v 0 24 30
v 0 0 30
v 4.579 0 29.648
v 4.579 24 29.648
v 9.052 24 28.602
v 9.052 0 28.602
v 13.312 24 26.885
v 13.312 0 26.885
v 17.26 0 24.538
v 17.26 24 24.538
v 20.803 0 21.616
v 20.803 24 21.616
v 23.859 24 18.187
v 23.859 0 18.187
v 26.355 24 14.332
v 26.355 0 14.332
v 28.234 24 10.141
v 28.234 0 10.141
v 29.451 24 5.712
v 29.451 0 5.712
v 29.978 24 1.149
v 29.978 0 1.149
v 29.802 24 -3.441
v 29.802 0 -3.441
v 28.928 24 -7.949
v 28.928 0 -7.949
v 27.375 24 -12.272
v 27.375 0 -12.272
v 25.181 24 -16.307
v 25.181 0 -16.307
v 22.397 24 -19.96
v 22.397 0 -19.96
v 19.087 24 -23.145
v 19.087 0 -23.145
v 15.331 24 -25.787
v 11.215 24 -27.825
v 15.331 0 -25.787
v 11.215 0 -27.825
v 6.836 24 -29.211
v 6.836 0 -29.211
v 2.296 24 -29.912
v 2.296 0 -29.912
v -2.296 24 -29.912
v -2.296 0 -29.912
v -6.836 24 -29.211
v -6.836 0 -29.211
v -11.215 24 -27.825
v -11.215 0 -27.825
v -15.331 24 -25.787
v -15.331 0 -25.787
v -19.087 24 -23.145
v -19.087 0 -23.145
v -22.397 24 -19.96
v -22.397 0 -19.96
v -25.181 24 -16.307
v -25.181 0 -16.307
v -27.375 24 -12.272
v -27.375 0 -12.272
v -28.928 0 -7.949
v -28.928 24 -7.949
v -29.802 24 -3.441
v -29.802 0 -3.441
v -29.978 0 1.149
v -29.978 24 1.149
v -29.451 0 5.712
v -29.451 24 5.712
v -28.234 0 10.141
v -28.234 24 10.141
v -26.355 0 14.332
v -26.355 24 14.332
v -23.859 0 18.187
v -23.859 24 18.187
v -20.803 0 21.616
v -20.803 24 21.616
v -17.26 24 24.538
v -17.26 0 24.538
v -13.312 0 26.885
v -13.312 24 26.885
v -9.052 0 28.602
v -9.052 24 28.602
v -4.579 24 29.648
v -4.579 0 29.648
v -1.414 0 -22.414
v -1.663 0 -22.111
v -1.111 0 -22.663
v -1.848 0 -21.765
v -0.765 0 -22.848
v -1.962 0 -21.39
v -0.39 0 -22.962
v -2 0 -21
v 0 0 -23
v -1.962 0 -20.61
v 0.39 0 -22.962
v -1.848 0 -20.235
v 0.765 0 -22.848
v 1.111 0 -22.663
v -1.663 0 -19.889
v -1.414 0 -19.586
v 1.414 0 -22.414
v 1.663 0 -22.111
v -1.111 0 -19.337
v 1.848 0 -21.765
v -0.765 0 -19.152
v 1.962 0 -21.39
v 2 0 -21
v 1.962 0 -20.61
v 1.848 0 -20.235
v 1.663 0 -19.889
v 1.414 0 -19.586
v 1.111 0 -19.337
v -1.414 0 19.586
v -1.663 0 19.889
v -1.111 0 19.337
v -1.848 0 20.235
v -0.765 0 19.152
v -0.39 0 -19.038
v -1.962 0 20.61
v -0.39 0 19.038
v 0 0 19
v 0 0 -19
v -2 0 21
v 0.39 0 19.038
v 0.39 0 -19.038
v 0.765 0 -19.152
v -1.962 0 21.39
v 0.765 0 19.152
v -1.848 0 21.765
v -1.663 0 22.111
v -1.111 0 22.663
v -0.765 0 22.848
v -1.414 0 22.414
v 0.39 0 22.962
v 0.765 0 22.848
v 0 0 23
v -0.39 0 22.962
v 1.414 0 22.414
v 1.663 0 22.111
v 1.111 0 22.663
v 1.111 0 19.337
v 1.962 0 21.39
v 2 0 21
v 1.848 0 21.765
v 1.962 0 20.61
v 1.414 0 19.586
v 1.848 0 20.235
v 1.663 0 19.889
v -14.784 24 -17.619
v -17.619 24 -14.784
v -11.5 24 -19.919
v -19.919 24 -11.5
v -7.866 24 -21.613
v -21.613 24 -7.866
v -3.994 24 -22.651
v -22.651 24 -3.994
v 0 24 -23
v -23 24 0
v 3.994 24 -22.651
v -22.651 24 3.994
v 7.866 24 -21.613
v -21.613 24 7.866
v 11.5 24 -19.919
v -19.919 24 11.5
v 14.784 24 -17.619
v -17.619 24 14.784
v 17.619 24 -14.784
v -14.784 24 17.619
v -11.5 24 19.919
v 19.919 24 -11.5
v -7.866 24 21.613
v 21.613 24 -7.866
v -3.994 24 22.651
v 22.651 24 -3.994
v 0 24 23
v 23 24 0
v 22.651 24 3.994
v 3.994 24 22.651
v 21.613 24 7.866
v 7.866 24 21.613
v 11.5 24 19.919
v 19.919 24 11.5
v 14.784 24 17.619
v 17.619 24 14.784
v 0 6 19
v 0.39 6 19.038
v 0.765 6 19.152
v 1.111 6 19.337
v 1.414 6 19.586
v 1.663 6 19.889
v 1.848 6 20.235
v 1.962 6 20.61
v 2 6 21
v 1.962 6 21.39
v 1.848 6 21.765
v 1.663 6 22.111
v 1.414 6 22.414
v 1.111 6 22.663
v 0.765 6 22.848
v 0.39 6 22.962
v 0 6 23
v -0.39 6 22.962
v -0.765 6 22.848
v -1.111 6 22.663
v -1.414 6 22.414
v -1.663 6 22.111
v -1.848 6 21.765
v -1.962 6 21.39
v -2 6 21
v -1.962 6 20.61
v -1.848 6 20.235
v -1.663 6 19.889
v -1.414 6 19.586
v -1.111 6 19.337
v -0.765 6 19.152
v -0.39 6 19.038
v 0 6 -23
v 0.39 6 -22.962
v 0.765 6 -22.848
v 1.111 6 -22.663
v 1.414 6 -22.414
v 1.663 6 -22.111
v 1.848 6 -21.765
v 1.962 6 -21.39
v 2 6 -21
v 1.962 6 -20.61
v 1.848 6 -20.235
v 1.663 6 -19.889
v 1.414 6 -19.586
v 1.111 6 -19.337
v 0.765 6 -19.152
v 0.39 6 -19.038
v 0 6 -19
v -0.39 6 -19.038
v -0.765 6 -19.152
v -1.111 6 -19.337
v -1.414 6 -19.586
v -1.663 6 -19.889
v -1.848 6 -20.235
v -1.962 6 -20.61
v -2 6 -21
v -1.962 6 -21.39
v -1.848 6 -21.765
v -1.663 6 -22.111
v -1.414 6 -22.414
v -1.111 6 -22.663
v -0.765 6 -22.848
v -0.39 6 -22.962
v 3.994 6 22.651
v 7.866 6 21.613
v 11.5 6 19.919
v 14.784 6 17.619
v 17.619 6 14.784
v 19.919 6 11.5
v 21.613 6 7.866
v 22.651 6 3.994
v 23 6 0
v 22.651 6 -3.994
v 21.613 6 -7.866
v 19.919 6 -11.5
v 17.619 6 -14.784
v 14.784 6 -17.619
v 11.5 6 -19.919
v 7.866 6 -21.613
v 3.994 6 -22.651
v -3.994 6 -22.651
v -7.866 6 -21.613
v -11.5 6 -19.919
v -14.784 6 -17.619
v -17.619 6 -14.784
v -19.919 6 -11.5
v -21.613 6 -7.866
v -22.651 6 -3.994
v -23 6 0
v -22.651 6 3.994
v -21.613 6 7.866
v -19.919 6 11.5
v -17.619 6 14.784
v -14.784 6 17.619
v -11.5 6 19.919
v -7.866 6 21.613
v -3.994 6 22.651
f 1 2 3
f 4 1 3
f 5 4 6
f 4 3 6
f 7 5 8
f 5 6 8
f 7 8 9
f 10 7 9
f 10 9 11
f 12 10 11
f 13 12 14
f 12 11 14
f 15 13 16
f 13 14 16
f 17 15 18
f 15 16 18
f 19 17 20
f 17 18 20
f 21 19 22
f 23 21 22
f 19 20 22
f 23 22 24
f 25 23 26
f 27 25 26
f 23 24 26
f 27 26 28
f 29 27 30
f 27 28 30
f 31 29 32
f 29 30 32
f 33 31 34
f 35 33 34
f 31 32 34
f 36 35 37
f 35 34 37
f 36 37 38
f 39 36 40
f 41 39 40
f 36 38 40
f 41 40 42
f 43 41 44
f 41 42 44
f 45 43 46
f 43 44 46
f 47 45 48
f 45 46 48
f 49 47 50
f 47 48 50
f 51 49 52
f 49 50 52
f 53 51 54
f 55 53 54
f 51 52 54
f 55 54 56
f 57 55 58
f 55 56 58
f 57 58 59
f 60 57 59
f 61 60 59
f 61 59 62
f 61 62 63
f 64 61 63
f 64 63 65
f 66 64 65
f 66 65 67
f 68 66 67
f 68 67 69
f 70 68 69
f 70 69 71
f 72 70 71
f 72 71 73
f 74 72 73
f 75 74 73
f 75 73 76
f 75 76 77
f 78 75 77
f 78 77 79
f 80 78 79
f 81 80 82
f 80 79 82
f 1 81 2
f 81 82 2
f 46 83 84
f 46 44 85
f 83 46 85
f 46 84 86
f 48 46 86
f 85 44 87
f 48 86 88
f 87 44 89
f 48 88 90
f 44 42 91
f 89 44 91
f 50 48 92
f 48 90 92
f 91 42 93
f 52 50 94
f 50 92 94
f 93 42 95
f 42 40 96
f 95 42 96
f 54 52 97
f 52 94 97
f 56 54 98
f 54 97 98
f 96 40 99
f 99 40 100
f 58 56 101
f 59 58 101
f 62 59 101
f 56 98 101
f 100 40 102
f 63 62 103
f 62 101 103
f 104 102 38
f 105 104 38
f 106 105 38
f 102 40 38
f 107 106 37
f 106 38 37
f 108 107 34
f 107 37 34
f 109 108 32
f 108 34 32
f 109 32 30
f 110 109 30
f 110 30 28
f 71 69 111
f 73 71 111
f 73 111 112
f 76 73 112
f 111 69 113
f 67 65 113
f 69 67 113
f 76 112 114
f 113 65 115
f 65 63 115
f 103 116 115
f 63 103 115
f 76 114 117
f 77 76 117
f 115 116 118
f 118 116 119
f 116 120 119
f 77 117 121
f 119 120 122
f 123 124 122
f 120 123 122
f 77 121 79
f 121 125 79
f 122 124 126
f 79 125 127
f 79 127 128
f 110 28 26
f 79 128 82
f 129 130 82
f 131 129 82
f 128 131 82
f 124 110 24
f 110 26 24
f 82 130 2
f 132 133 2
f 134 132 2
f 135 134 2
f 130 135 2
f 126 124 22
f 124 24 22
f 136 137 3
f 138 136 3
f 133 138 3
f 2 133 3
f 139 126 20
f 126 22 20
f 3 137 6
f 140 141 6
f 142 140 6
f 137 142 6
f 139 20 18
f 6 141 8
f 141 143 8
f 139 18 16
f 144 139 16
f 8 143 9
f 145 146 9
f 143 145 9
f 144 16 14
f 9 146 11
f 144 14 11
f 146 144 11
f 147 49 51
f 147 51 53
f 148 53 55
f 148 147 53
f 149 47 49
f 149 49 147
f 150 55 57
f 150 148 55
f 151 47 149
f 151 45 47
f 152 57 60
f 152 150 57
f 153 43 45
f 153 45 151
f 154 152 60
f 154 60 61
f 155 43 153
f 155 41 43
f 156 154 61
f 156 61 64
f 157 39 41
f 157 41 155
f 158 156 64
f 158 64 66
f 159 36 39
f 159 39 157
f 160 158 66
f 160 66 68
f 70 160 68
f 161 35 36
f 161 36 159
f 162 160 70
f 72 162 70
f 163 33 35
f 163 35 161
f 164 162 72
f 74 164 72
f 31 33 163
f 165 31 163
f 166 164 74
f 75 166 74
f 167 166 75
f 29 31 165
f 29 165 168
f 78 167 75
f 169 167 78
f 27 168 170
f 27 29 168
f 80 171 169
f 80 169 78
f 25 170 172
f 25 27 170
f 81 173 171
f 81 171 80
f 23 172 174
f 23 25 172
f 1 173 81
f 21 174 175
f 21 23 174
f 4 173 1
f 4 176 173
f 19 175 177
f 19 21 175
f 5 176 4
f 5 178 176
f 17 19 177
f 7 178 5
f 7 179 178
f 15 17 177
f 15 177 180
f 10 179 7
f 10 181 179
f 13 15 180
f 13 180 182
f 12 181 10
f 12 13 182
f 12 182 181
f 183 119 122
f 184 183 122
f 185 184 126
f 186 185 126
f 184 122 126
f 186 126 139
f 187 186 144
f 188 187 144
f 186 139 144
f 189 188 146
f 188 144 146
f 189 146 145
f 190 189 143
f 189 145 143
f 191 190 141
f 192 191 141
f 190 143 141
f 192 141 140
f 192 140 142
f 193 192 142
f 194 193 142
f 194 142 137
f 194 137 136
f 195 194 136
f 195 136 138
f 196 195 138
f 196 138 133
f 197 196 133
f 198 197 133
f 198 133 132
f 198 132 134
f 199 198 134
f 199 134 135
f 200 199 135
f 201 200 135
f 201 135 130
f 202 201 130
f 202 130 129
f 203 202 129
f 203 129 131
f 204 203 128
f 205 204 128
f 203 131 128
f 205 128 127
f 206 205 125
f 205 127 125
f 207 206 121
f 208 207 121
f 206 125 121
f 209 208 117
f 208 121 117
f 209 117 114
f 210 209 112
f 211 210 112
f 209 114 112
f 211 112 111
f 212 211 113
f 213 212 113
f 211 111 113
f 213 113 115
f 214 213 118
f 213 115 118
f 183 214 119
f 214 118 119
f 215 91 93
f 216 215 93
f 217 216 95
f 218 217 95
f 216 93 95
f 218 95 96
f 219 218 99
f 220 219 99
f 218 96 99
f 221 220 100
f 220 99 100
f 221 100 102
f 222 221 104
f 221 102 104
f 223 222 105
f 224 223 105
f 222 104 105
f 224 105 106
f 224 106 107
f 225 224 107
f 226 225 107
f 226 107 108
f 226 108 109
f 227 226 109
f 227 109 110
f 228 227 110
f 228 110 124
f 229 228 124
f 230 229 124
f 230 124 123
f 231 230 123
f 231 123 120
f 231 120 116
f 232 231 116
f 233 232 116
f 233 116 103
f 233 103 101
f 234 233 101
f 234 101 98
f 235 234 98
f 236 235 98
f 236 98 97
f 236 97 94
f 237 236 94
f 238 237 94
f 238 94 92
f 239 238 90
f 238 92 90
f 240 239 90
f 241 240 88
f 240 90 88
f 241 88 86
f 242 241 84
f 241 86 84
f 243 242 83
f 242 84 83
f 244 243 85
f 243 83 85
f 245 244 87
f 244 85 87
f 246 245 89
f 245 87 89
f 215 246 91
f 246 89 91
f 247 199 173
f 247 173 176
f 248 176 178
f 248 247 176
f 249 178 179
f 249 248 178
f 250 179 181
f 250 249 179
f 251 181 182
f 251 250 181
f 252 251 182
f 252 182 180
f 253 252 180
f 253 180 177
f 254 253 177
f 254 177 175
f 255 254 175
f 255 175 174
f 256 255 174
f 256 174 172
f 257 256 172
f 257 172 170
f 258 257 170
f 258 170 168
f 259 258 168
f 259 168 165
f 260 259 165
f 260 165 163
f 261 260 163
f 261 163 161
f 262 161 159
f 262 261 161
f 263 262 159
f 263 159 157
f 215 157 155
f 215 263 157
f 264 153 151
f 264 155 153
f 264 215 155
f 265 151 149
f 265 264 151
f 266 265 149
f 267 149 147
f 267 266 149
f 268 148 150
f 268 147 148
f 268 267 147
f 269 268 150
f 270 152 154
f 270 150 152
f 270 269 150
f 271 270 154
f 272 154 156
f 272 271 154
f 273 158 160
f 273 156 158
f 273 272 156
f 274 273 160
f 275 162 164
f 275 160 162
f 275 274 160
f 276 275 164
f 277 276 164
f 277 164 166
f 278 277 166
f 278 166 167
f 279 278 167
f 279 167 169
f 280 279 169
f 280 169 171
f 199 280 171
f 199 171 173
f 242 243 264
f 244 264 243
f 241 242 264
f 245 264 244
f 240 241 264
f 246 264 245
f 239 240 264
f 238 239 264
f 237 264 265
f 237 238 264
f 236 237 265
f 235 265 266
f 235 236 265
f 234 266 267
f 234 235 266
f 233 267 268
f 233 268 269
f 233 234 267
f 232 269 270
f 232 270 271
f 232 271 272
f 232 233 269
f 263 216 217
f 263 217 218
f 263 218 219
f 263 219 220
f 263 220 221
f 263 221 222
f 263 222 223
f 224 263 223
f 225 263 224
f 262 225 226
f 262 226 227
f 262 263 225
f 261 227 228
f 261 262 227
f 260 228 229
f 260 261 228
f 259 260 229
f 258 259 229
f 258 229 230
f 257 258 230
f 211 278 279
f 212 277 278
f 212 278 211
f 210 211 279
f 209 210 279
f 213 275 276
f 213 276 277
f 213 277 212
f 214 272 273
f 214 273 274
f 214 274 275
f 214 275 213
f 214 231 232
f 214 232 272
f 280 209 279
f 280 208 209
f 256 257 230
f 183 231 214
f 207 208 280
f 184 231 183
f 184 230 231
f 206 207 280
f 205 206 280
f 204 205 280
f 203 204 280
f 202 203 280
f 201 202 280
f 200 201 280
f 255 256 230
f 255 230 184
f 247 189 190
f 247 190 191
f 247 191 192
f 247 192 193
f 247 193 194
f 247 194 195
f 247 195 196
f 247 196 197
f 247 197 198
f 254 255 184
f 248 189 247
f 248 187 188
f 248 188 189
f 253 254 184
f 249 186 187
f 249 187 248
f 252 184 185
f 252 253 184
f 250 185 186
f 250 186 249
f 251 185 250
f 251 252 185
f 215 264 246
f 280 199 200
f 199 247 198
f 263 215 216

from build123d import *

# Parameters (mm, degrees)
SKETCH1_R           = 30
SKETCH1_R_2         = 23
BOSS_EXTRUDE1_DEPTH = 24
SKETCH1_2_R         = 23
BOSS_EXTRUDE2_DEPTH = 6
SKETCH2_R           = 2
CUT_EXTRUDE1_DEPTH  = 49.744230428


with BuildPart() as part:
    # Sketch1 → Boss-Extrude1 (new body)
    with BuildSketch(Plane(origin=(0, 0, 0), x_dir=(1, 0, 0), z_dir=(0, 1, 0))):
        Circle(SKETCH1_R)
        Circle(SKETCH1_R_2, mode=Mode.SUBTRACT)
    extrude(amount=BOSS_EXTRUDE1_DEPTH)

    # Sketch1<2> → Boss-Extrude2 (add)
    with BuildSketch(Plane(origin=(0, 0, 0), x_dir=(1, 0, 0), z_dir=(0, 1, 0))):
        Circle(SKETCH1_2_R)
    extrude(amount=BOSS_EXTRUDE2_DEPTH)

    # Sketch2 → Cut-Extrude1 (cut, through all)
    with BuildSketch(Plane.XZ):
        with Locations((0, 21)):
            Circle(SKETCH2_R)
        with Locations((0, -21)):
            Circle(SKETCH2_R)
    extrude(amount=-CUT_EXTRUDE1_DEPTH, mode=Mode.SUBTRACT)


solid = part.part
